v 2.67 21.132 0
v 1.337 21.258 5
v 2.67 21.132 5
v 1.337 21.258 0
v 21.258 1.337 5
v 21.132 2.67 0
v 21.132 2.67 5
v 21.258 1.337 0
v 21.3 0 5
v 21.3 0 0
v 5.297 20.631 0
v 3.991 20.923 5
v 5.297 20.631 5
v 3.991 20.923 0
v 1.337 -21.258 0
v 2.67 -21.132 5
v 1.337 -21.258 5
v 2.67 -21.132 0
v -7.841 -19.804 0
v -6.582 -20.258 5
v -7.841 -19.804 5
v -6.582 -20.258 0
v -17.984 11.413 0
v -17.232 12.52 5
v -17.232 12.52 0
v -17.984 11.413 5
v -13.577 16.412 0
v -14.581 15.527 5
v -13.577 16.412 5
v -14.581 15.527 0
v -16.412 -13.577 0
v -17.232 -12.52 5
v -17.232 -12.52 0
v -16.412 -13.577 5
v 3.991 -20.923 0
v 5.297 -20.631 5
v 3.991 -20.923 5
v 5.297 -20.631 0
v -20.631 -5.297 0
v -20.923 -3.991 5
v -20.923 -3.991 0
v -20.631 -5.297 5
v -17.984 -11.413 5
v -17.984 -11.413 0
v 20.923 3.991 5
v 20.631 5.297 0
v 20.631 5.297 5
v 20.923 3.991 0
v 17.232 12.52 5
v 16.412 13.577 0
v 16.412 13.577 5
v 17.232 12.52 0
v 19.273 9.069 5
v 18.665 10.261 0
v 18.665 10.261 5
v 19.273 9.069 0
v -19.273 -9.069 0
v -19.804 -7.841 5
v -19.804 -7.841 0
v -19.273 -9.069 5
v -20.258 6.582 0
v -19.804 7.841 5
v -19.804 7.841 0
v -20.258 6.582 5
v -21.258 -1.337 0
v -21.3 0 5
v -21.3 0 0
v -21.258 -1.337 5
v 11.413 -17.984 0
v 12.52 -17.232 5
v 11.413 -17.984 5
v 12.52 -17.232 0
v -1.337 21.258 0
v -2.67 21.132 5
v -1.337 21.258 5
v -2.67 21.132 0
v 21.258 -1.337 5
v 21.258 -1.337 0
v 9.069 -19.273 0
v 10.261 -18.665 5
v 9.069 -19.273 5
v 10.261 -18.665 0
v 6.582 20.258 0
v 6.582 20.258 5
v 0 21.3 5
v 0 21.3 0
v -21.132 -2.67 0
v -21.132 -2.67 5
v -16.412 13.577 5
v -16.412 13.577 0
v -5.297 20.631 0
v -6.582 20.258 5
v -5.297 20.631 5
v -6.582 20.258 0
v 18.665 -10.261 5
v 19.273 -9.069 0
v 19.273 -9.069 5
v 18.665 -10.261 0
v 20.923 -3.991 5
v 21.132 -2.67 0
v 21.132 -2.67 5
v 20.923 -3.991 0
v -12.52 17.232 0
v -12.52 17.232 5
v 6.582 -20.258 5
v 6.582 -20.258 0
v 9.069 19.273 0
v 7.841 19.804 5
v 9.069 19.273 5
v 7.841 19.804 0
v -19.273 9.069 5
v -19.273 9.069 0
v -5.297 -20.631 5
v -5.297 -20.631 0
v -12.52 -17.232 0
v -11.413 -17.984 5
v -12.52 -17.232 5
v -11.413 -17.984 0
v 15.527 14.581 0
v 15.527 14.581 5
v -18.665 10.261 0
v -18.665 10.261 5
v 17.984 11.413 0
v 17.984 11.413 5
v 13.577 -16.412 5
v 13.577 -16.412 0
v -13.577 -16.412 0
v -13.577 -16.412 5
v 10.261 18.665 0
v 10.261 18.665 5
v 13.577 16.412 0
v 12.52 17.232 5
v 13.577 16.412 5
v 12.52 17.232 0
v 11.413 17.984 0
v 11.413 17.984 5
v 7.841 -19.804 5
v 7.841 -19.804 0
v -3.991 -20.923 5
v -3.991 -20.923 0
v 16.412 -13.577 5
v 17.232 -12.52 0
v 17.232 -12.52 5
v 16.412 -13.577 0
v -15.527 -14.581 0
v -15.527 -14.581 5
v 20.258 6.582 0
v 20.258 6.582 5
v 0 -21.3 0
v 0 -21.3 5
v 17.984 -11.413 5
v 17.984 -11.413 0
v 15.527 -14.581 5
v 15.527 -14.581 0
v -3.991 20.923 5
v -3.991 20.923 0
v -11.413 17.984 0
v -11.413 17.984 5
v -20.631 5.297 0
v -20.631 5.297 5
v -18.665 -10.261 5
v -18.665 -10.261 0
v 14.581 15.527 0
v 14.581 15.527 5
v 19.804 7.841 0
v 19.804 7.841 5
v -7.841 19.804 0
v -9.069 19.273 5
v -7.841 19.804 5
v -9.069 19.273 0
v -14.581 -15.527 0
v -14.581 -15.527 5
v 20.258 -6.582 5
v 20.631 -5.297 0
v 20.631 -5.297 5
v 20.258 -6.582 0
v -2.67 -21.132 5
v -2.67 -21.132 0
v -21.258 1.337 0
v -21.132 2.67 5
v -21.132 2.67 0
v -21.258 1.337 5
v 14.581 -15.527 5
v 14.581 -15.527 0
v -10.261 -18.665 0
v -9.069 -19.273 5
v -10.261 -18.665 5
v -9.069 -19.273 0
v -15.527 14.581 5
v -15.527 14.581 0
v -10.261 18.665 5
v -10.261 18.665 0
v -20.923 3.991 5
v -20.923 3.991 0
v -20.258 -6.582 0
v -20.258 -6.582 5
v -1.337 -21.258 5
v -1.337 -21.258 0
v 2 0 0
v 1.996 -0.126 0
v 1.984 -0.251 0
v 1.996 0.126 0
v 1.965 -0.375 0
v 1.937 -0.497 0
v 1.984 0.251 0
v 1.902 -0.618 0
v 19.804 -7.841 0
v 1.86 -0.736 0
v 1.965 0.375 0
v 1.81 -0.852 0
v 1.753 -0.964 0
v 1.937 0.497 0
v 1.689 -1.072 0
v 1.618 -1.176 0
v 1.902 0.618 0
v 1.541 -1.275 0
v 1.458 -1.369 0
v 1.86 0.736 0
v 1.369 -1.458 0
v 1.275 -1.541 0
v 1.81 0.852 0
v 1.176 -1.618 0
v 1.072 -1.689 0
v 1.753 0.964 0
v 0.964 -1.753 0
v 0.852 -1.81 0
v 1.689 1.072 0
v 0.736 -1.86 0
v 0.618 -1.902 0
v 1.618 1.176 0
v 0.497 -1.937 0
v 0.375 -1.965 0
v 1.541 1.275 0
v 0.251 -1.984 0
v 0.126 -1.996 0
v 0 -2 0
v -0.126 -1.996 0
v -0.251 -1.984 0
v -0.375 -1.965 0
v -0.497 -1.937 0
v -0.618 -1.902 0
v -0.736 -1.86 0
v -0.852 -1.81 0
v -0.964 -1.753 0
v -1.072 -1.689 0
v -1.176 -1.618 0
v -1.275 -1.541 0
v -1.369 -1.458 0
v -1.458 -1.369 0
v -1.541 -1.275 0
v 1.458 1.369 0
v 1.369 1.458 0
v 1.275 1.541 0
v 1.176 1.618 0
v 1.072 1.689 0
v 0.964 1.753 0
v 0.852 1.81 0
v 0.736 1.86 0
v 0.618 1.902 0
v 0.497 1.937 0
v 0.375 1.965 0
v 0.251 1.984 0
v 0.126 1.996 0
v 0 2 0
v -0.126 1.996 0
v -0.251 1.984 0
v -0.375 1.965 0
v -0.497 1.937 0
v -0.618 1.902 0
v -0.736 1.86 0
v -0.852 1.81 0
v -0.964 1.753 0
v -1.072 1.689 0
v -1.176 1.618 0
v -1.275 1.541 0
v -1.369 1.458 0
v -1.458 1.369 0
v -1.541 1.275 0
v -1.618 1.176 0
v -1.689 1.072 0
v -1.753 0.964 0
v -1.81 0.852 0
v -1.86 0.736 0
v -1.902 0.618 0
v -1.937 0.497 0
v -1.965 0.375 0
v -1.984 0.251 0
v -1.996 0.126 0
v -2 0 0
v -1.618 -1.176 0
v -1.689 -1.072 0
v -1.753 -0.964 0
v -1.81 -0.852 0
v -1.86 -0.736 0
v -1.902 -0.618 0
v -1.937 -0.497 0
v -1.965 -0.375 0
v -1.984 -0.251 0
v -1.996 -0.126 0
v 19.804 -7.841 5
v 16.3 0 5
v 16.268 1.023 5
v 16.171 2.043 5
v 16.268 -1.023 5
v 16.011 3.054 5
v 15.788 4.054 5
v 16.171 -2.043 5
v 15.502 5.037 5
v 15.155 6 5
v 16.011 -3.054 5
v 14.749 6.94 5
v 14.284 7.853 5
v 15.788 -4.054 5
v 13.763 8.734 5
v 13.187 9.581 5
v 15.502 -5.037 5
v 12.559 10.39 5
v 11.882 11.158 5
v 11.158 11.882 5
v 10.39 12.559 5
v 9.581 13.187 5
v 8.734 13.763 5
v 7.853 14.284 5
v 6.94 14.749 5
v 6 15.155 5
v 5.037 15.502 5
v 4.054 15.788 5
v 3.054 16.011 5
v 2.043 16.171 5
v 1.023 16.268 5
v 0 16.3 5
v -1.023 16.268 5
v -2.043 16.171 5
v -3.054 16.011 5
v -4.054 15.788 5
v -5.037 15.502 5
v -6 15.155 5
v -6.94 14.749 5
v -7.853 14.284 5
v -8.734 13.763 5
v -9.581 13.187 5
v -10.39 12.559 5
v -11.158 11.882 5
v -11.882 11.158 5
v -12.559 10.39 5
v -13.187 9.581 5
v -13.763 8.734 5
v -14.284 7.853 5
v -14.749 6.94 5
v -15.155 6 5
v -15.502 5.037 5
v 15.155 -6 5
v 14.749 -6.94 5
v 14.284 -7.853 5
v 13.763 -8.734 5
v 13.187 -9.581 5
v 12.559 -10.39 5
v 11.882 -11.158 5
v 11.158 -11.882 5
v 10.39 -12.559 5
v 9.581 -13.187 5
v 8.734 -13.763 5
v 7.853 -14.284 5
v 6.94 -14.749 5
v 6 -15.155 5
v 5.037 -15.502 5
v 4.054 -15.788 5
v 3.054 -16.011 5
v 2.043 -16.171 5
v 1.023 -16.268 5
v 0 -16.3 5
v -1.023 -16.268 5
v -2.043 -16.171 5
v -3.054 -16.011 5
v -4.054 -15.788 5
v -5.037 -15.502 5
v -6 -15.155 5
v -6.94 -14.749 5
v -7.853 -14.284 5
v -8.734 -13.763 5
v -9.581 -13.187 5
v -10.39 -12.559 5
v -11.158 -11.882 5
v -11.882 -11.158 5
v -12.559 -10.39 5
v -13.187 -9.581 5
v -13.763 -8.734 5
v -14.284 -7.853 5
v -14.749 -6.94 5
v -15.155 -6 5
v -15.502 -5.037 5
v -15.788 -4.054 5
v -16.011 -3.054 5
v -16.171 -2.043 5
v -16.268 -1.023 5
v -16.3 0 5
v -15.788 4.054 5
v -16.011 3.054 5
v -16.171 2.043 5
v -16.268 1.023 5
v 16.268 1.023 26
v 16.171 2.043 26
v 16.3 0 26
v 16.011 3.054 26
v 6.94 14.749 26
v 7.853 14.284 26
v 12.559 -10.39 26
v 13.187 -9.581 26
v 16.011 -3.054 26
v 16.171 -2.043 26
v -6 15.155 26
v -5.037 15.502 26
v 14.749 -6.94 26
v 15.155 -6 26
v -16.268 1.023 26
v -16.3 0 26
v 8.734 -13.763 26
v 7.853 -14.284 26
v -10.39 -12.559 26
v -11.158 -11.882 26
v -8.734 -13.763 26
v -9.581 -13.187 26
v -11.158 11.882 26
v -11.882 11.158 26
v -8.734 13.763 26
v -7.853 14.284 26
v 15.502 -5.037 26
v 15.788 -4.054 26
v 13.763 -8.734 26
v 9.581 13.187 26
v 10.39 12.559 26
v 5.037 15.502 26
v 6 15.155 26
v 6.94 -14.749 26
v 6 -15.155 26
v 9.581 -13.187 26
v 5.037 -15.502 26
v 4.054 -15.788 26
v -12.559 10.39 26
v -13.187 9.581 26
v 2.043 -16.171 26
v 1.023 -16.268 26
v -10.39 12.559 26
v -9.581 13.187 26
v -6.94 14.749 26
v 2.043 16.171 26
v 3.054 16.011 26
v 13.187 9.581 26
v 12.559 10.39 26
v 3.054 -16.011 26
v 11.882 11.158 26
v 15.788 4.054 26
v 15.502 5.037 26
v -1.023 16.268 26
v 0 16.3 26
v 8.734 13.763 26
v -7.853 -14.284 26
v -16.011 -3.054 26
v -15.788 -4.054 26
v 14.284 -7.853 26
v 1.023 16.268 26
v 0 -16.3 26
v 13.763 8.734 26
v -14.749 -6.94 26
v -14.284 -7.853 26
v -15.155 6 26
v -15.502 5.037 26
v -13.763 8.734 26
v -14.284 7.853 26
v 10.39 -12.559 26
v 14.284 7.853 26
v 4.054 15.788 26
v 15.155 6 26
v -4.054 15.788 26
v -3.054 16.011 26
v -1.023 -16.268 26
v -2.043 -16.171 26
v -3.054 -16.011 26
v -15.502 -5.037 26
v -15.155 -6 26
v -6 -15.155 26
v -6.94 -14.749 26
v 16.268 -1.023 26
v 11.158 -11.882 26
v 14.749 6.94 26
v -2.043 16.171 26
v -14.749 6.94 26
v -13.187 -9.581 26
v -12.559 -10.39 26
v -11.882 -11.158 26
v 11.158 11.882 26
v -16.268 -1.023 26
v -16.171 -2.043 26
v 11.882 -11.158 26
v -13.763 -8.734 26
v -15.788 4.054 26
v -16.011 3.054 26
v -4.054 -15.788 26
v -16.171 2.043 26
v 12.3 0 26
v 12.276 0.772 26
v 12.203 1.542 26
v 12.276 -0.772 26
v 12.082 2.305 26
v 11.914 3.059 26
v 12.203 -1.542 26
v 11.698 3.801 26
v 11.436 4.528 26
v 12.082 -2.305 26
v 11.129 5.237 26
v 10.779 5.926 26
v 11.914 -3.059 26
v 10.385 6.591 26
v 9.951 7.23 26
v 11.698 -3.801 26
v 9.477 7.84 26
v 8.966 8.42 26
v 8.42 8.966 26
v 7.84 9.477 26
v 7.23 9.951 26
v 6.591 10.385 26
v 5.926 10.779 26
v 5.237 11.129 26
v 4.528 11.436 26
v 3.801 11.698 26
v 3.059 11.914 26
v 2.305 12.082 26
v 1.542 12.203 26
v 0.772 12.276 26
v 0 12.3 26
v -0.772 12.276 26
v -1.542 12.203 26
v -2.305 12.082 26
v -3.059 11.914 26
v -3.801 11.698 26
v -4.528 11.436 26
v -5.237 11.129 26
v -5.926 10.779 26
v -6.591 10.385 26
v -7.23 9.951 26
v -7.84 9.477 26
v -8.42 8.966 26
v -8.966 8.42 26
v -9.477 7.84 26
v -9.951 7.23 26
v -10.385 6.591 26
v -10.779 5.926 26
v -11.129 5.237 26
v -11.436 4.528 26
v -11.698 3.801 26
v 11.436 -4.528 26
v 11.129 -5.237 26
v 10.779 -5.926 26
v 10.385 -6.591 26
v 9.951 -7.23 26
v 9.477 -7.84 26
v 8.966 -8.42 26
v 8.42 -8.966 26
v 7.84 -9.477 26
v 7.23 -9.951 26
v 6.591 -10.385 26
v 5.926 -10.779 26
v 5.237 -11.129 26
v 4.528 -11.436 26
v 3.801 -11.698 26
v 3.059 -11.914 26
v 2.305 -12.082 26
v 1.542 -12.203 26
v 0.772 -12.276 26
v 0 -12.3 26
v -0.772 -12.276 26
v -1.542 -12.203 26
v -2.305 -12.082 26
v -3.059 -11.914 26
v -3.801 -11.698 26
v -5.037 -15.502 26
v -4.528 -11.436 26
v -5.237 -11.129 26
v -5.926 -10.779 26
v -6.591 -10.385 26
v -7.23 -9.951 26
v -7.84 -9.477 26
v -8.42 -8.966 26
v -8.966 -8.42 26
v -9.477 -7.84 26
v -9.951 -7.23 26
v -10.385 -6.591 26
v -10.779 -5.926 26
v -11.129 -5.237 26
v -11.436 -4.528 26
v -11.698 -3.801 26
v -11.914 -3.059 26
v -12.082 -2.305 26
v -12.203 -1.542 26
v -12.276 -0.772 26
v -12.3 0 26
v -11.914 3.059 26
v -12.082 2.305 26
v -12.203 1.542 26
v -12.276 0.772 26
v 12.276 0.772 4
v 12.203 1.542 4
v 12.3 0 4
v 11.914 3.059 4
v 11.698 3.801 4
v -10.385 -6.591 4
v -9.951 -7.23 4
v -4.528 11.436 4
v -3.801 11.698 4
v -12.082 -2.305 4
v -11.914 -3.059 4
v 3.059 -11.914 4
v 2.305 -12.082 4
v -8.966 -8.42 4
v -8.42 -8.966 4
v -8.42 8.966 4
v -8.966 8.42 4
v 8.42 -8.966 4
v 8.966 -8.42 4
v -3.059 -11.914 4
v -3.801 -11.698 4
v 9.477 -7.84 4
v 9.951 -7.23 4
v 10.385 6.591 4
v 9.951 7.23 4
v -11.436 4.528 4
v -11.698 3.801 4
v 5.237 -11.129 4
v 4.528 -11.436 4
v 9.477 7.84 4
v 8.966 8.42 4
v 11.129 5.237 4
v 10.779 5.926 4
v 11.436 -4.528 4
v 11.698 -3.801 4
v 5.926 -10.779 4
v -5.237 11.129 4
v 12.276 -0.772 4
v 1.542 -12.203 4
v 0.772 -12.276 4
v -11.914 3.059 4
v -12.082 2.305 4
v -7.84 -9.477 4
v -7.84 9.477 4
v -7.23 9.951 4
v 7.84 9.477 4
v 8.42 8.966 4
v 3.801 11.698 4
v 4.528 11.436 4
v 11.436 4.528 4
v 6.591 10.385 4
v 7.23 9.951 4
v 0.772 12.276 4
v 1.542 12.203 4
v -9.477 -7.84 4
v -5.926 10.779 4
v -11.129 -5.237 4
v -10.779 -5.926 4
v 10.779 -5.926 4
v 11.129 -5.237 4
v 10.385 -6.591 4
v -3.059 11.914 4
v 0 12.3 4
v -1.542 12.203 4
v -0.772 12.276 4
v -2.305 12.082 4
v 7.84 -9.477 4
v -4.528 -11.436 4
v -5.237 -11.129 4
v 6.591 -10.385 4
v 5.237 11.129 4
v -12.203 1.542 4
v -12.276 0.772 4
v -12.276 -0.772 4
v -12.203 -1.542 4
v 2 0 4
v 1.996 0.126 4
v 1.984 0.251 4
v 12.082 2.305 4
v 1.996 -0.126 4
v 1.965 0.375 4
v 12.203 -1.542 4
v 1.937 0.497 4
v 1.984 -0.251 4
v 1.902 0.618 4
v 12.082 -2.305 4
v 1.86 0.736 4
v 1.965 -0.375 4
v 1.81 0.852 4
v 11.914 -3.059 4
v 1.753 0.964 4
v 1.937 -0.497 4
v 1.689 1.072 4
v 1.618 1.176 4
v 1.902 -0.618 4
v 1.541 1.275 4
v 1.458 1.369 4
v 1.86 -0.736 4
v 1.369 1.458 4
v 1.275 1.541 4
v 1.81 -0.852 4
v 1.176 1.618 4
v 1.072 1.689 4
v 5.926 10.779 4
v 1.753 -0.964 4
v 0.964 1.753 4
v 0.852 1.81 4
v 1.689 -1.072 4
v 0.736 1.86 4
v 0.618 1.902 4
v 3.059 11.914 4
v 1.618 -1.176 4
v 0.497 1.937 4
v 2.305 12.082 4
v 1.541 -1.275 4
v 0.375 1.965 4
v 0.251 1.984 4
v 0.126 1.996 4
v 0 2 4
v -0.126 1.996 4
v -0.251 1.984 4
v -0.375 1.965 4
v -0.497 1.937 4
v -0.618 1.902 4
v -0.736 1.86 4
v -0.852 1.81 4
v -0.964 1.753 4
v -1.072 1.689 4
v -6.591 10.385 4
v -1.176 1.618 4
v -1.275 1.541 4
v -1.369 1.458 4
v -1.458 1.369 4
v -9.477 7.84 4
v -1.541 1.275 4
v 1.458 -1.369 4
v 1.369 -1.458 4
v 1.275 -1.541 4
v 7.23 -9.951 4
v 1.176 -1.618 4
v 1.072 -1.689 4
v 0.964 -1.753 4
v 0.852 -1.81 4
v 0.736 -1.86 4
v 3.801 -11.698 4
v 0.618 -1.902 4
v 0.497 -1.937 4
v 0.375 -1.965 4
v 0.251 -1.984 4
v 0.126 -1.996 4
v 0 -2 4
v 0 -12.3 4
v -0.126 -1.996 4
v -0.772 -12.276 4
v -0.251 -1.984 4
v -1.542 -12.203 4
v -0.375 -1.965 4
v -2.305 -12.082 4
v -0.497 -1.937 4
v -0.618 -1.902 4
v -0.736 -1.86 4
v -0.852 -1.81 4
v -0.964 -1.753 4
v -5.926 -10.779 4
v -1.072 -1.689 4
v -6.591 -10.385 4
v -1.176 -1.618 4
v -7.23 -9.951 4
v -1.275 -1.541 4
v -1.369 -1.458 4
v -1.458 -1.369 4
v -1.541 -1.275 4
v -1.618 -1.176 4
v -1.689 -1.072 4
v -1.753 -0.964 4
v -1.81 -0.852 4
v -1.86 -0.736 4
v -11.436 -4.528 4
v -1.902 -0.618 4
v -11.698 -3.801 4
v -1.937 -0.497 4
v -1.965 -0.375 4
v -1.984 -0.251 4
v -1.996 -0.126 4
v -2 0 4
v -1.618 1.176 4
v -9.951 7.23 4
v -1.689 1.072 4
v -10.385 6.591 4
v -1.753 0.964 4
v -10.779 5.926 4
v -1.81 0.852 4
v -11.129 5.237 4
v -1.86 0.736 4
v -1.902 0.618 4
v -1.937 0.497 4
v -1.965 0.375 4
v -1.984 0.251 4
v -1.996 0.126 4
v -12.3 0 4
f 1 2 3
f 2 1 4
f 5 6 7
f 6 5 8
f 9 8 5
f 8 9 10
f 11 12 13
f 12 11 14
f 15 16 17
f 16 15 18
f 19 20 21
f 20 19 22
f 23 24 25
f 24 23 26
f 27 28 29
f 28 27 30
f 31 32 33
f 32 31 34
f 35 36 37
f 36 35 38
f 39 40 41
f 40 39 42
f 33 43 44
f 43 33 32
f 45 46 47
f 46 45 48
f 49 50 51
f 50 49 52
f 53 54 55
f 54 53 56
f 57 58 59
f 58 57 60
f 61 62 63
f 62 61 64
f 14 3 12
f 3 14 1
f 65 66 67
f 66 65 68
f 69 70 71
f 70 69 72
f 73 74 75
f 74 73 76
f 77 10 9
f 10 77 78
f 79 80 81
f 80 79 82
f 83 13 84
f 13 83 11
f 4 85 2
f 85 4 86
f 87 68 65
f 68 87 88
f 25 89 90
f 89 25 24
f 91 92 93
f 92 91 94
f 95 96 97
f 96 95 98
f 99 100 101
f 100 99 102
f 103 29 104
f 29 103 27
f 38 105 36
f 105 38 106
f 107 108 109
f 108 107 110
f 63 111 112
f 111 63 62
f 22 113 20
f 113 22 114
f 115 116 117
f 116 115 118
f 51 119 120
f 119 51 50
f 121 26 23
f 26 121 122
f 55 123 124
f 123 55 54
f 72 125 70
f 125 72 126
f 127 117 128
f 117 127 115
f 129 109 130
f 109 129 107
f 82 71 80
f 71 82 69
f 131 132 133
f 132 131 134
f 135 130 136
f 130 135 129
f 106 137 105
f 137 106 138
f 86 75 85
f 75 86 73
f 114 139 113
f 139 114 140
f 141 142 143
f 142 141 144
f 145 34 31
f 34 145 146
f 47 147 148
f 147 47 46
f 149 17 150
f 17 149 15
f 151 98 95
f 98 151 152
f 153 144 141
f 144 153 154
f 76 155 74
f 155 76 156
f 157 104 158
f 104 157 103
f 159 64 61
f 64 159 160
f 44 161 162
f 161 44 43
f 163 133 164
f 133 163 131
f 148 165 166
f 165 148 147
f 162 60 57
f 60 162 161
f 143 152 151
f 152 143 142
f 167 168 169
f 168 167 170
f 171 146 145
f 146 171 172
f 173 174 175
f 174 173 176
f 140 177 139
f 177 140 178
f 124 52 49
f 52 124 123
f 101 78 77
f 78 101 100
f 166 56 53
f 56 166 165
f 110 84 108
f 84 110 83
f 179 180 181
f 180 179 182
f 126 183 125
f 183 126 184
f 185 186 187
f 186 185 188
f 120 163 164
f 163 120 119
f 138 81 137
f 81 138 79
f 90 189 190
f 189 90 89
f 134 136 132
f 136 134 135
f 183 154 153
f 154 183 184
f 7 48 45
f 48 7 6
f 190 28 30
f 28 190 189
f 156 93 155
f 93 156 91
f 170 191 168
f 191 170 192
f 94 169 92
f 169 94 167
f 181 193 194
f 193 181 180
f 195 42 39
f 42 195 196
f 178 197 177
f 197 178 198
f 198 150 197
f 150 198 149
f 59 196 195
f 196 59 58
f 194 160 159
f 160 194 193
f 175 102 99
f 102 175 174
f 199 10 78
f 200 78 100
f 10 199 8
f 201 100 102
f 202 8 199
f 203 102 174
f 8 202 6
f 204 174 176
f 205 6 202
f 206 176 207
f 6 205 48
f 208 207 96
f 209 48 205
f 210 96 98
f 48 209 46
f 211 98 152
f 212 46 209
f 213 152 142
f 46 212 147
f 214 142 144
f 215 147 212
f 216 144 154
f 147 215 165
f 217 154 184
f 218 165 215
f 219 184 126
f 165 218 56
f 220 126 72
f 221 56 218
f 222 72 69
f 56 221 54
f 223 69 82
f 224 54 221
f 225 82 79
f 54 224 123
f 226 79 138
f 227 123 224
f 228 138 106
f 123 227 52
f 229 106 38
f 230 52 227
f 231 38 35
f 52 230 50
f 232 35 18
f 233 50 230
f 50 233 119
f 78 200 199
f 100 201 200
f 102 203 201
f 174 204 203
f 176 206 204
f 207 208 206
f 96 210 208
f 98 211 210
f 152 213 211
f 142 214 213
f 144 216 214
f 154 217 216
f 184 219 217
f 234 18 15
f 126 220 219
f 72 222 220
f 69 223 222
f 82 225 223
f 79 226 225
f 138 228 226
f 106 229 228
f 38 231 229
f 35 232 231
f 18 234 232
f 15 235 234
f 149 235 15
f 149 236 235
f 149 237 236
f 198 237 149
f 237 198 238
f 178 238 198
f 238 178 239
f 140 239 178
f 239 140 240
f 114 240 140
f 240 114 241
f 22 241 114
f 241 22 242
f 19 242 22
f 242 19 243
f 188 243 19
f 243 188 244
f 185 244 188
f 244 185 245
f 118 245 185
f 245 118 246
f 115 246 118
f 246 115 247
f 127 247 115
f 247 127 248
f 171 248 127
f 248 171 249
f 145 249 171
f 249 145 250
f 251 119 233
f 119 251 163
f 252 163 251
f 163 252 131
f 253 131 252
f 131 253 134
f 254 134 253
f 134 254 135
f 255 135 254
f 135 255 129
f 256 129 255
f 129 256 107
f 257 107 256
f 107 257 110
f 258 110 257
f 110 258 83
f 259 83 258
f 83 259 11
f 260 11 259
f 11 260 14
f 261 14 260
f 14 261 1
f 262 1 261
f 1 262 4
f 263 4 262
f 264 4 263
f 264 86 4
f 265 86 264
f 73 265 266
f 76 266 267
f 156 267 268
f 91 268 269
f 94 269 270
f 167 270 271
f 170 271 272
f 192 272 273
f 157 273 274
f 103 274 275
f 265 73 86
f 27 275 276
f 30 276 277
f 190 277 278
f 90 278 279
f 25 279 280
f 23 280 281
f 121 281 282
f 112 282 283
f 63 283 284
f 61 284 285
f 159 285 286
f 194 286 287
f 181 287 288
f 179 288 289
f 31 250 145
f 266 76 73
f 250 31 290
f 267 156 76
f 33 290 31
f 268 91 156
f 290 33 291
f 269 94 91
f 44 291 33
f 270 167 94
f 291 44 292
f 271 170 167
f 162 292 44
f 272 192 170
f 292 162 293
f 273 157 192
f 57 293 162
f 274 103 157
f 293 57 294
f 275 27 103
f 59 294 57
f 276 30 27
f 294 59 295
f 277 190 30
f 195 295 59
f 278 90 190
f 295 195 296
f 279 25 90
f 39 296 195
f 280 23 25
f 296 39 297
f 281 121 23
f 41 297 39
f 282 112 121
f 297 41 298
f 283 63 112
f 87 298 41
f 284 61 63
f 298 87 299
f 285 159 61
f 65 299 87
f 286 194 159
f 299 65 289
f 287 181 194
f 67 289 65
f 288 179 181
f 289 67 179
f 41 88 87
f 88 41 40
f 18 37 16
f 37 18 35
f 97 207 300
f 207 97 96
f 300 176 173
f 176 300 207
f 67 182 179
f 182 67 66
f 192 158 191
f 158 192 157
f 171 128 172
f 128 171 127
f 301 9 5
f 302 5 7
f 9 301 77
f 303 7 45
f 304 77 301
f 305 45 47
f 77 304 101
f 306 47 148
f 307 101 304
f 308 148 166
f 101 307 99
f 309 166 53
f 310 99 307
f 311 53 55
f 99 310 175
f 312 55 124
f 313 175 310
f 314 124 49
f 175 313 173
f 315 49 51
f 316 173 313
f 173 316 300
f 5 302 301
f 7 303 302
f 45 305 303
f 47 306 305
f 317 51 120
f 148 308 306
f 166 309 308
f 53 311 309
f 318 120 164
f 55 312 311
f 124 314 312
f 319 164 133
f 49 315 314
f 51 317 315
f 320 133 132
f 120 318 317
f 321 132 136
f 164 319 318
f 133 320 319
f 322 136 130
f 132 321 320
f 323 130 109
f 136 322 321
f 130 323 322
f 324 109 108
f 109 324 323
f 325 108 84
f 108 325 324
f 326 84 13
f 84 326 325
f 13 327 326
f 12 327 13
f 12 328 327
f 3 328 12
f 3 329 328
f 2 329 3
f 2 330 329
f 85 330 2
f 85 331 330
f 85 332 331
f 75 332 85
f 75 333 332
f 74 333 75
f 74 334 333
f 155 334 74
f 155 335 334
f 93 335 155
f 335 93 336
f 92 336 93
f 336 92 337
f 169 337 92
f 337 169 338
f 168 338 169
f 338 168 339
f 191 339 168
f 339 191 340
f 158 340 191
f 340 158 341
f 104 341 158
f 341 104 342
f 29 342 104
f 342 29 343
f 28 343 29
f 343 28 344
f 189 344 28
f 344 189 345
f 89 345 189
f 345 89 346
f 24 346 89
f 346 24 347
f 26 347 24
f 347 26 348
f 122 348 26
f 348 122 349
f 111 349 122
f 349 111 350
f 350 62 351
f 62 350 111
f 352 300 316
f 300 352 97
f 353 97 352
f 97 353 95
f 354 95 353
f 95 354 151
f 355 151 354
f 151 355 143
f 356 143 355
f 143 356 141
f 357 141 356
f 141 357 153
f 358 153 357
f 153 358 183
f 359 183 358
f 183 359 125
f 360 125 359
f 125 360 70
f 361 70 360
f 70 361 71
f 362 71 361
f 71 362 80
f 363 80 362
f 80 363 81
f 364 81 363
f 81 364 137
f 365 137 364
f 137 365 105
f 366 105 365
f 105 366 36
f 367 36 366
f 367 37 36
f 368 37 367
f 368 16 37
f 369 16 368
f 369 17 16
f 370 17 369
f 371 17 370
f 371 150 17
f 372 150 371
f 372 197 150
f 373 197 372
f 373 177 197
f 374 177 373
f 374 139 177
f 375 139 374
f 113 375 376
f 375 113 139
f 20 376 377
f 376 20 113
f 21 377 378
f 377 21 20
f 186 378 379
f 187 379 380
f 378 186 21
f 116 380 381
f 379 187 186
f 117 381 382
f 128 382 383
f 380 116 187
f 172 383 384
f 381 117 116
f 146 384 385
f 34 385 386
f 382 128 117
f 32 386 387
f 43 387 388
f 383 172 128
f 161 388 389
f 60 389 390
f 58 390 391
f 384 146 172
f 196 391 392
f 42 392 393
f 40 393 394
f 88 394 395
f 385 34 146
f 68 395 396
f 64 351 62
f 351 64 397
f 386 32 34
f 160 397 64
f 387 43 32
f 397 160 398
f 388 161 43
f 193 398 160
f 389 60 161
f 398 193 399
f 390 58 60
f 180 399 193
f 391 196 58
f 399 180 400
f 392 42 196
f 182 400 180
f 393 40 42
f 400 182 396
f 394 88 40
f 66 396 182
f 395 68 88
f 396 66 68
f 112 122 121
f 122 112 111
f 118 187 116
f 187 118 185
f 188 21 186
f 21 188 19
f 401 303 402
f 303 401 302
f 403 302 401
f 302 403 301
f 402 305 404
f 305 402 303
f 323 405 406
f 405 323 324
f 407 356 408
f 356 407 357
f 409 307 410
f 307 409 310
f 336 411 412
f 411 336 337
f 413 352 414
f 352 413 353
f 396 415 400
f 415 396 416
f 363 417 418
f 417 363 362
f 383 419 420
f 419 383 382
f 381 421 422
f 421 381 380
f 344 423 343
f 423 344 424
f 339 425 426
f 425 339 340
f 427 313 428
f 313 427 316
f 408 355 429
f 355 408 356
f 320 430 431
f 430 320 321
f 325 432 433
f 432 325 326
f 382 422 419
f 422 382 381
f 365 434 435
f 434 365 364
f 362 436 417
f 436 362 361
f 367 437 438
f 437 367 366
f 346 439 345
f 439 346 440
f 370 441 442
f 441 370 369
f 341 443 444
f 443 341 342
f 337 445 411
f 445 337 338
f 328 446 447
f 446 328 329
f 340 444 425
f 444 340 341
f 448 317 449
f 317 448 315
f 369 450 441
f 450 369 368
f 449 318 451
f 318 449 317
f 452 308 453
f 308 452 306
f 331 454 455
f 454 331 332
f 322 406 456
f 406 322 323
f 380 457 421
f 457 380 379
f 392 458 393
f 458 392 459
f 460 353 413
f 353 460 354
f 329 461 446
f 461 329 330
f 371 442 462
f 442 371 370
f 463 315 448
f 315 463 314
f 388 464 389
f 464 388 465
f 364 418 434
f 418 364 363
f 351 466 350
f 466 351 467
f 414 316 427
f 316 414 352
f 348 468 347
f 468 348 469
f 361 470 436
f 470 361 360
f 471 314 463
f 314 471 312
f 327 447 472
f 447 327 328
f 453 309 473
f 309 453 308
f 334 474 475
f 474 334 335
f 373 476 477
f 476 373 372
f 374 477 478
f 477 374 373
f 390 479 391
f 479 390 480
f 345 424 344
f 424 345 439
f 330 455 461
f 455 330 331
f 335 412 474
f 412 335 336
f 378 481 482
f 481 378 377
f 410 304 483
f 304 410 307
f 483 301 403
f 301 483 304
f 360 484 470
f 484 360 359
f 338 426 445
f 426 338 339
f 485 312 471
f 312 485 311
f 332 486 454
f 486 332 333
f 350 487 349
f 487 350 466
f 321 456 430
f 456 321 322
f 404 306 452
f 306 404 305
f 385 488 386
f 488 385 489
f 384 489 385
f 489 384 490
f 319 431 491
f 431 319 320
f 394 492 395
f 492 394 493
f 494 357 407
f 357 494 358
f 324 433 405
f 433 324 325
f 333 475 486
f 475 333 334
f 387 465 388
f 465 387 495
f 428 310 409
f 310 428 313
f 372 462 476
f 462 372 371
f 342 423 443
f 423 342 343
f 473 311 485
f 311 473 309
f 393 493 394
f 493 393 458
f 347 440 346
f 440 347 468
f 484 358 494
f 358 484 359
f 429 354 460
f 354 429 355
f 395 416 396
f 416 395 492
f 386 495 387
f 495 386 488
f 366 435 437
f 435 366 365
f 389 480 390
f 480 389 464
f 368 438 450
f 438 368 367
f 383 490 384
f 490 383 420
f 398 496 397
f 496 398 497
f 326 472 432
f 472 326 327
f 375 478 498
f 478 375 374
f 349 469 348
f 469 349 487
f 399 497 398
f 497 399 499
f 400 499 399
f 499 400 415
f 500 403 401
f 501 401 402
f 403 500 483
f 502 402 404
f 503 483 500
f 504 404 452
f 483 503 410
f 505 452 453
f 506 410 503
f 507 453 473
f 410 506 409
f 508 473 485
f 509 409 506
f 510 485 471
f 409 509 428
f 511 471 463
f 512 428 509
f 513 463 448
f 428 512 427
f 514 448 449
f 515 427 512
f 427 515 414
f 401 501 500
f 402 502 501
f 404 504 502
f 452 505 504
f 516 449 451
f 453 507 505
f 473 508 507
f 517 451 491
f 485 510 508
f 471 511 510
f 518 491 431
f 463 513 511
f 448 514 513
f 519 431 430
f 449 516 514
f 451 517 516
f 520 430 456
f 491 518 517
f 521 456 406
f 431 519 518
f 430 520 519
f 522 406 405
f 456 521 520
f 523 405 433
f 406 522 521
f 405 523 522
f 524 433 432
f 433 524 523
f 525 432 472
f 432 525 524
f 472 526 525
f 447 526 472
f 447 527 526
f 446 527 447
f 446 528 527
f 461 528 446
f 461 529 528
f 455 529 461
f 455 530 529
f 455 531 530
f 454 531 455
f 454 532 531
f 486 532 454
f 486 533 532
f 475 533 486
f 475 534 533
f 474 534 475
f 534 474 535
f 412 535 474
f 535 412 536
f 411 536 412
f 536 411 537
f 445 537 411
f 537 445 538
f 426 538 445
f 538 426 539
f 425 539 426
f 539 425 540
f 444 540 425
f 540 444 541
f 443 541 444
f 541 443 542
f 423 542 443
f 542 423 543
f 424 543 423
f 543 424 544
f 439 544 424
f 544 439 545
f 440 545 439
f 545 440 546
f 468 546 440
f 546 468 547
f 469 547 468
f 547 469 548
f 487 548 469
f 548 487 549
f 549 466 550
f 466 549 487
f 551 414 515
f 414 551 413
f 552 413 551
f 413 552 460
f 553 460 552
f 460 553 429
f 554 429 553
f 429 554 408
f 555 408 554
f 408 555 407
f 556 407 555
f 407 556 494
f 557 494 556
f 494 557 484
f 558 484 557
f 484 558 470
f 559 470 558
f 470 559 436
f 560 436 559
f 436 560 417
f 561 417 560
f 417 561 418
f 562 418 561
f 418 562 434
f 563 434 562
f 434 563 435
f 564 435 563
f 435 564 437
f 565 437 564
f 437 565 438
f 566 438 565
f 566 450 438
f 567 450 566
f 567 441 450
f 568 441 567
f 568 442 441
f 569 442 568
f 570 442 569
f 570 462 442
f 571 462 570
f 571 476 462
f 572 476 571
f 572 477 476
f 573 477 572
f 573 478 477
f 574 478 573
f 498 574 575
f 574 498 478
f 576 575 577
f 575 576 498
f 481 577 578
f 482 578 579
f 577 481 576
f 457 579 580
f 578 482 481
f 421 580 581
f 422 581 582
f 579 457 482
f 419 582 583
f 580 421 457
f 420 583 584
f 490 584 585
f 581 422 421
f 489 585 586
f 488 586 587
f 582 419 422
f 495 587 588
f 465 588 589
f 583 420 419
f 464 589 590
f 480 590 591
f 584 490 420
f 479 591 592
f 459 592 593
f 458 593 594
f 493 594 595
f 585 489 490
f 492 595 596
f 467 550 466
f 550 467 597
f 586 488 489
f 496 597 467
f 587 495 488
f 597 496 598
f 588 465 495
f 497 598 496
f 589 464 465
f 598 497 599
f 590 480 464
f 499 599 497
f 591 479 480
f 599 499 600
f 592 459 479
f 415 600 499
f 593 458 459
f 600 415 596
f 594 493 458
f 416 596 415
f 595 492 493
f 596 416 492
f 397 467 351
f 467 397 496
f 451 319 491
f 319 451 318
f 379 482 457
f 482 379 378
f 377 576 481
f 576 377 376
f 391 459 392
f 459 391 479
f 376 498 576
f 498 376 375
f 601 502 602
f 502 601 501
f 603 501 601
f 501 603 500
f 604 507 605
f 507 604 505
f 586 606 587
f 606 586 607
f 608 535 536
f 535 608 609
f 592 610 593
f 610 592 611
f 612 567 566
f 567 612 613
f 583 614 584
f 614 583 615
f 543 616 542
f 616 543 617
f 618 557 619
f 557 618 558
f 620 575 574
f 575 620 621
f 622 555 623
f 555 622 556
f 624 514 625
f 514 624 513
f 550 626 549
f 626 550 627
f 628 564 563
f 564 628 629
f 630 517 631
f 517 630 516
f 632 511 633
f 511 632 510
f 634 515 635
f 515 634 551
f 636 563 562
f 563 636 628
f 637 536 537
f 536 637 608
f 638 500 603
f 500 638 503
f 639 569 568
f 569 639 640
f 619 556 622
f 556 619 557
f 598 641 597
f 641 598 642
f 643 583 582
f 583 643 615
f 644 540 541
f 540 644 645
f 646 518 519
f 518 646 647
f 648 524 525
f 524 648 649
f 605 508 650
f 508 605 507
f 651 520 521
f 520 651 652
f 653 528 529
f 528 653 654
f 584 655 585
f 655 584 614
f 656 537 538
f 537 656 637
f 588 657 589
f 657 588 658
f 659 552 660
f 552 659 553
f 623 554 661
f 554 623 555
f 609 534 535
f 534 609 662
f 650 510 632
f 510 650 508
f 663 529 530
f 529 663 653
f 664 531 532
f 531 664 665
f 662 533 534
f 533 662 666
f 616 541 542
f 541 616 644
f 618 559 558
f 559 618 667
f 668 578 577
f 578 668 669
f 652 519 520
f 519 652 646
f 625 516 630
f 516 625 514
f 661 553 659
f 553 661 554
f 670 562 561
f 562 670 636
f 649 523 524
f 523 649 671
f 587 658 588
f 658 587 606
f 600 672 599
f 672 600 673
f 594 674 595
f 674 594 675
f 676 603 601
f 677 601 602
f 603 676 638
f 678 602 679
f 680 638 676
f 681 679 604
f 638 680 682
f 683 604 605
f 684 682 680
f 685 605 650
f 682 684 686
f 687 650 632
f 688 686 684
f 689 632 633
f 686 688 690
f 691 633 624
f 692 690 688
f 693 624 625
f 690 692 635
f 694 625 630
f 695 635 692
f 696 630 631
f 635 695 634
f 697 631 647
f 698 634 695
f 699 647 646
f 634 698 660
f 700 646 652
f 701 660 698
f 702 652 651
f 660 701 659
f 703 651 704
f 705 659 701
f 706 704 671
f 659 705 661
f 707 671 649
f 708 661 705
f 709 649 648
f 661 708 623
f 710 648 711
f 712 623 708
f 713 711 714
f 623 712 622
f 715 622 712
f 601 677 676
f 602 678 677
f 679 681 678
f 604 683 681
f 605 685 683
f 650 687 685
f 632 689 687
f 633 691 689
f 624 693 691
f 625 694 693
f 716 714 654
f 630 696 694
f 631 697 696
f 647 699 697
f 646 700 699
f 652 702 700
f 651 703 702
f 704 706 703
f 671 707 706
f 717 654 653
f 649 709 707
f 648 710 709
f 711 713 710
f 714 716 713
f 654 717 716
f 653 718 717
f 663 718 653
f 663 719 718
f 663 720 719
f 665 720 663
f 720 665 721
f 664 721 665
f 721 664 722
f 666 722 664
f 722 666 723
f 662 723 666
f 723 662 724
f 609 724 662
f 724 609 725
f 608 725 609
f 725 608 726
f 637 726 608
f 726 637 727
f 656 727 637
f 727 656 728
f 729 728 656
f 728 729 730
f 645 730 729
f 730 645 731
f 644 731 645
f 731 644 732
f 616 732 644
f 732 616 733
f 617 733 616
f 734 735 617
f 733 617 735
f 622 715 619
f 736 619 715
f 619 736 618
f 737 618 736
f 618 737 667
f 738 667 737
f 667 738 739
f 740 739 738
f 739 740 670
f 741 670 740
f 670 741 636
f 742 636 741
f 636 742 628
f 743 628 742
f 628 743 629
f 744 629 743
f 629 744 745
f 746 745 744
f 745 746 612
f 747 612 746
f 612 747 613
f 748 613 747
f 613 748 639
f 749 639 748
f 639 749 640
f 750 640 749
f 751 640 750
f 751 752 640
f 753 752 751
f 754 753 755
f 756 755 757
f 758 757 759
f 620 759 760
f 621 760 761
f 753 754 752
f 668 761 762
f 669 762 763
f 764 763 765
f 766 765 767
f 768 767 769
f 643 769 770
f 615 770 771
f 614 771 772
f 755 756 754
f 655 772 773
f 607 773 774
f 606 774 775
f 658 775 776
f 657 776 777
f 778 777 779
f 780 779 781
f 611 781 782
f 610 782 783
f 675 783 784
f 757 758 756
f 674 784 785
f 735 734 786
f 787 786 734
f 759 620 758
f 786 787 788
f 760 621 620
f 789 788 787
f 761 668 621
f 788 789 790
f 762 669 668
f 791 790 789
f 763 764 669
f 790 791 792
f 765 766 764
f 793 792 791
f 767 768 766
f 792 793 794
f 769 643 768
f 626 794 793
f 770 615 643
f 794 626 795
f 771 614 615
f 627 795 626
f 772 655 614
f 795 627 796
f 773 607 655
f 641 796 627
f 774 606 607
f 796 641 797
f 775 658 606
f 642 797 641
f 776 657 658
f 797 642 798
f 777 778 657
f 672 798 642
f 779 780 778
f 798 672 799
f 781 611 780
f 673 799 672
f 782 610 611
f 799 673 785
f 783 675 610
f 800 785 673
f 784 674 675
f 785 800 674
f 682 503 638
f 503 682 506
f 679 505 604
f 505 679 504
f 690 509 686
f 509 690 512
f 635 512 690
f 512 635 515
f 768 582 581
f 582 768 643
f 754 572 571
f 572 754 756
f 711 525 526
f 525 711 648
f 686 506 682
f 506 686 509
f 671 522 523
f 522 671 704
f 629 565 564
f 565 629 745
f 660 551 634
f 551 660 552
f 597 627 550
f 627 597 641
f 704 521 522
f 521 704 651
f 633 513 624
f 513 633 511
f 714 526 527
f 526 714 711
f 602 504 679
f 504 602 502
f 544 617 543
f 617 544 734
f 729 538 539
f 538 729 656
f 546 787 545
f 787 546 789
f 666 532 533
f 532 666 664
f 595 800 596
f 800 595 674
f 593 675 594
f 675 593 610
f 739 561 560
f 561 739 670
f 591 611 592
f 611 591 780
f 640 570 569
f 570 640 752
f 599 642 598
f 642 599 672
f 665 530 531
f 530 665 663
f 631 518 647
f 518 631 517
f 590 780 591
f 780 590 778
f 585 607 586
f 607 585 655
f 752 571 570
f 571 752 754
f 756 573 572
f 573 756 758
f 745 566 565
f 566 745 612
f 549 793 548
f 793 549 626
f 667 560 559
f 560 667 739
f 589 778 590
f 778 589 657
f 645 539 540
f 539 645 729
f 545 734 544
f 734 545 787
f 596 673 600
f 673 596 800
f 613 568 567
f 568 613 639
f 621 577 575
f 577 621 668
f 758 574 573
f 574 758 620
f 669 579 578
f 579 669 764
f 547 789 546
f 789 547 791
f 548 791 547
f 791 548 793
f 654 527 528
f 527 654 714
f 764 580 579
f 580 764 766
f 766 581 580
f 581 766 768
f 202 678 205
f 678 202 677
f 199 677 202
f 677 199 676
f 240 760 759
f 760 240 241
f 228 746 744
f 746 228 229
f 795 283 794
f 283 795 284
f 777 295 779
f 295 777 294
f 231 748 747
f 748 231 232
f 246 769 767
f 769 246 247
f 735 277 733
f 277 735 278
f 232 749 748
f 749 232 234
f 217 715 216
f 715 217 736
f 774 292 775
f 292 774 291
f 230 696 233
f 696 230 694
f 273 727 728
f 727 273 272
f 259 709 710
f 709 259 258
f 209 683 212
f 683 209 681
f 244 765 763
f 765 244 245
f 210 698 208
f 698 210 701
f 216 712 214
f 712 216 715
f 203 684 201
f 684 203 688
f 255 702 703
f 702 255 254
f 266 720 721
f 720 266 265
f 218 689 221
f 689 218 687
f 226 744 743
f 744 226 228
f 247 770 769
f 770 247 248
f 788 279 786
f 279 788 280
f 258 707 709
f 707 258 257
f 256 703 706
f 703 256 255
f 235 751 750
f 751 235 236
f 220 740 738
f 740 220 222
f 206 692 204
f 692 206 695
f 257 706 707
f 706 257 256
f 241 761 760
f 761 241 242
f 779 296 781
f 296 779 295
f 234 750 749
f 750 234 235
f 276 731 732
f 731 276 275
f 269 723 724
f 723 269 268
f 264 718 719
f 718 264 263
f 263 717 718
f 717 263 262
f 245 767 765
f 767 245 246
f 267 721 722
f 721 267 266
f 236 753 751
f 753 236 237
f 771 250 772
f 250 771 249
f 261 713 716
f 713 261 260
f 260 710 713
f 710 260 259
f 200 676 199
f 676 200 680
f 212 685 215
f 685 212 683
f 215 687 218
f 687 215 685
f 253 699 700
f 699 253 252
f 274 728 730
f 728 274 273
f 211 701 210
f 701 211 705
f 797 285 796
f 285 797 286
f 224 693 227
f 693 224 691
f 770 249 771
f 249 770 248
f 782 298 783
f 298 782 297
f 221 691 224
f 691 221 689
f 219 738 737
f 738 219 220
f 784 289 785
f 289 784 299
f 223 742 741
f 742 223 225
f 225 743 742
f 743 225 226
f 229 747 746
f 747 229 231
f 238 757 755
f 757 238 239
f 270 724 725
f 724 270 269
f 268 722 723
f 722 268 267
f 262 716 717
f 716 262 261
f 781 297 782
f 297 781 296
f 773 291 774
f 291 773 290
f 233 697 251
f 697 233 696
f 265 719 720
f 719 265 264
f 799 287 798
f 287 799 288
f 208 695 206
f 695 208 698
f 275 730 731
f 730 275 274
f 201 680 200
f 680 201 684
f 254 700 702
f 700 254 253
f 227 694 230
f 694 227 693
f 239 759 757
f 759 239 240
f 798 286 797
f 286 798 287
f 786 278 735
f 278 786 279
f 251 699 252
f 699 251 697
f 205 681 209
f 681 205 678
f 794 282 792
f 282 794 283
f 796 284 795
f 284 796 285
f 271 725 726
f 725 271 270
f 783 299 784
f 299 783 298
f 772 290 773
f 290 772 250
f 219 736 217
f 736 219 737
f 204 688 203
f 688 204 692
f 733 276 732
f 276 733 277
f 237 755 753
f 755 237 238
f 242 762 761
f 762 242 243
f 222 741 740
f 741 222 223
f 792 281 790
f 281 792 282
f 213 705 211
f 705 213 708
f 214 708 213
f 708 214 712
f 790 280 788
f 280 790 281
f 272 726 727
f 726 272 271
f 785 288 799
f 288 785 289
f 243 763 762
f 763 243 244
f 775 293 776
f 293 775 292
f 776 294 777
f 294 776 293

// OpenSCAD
$fn = 100;

// Variant 1
// HOLDER_DIAMETER = 24.6;
// HOLDER_HEIGHT = 26;
// HOLDER_WALL_THICKNESS = 4;

// Variant 2
HOLDER_DIAMETER = 32.6;
HOLDER_HEIGHT = 26;
HOLDER_WALL_THICKNESS = 4;

STABILITY_RING = true;
STABILITY_RING_HEIGHT = 5;
// Only the added diameter around the Holder Diameter
STABILITY_RING_DIAMETER = 10;

SCREW_HOLE = true;
SCREW_HOLE_DIAMETER = 4;

difference() {
  // Main Holder Body, with optional stability ring
  union() {
    if (STABILITY_RING) {
      cylinder(h=STABILITY_RING_HEIGHT, d=HOLDER_DIAMETER + STABILITY_RING_DIAMETER, center=false);
    }
    cylinder(h=HOLDER_HEIGHT, d=HOLDER_DIAMETER, center=false);
  }
  // Hollow out the inside
  translate(v=[0, 0, HOLDER_WALL_THICKNESS]) {
    cylinder(h=HOLDER_HEIGHT - HOLDER_WALL_THICKNESS, d=HOLDER_DIAMETER - 2 * HOLDER_WALL_THICKNESS, center=false);
  }

  if (SCREW_HOLE) {
    cylinder(h=HOLDER_WALL_THICKNESS, d=SCREW_HOLE_DIAMETER);
  }
}
